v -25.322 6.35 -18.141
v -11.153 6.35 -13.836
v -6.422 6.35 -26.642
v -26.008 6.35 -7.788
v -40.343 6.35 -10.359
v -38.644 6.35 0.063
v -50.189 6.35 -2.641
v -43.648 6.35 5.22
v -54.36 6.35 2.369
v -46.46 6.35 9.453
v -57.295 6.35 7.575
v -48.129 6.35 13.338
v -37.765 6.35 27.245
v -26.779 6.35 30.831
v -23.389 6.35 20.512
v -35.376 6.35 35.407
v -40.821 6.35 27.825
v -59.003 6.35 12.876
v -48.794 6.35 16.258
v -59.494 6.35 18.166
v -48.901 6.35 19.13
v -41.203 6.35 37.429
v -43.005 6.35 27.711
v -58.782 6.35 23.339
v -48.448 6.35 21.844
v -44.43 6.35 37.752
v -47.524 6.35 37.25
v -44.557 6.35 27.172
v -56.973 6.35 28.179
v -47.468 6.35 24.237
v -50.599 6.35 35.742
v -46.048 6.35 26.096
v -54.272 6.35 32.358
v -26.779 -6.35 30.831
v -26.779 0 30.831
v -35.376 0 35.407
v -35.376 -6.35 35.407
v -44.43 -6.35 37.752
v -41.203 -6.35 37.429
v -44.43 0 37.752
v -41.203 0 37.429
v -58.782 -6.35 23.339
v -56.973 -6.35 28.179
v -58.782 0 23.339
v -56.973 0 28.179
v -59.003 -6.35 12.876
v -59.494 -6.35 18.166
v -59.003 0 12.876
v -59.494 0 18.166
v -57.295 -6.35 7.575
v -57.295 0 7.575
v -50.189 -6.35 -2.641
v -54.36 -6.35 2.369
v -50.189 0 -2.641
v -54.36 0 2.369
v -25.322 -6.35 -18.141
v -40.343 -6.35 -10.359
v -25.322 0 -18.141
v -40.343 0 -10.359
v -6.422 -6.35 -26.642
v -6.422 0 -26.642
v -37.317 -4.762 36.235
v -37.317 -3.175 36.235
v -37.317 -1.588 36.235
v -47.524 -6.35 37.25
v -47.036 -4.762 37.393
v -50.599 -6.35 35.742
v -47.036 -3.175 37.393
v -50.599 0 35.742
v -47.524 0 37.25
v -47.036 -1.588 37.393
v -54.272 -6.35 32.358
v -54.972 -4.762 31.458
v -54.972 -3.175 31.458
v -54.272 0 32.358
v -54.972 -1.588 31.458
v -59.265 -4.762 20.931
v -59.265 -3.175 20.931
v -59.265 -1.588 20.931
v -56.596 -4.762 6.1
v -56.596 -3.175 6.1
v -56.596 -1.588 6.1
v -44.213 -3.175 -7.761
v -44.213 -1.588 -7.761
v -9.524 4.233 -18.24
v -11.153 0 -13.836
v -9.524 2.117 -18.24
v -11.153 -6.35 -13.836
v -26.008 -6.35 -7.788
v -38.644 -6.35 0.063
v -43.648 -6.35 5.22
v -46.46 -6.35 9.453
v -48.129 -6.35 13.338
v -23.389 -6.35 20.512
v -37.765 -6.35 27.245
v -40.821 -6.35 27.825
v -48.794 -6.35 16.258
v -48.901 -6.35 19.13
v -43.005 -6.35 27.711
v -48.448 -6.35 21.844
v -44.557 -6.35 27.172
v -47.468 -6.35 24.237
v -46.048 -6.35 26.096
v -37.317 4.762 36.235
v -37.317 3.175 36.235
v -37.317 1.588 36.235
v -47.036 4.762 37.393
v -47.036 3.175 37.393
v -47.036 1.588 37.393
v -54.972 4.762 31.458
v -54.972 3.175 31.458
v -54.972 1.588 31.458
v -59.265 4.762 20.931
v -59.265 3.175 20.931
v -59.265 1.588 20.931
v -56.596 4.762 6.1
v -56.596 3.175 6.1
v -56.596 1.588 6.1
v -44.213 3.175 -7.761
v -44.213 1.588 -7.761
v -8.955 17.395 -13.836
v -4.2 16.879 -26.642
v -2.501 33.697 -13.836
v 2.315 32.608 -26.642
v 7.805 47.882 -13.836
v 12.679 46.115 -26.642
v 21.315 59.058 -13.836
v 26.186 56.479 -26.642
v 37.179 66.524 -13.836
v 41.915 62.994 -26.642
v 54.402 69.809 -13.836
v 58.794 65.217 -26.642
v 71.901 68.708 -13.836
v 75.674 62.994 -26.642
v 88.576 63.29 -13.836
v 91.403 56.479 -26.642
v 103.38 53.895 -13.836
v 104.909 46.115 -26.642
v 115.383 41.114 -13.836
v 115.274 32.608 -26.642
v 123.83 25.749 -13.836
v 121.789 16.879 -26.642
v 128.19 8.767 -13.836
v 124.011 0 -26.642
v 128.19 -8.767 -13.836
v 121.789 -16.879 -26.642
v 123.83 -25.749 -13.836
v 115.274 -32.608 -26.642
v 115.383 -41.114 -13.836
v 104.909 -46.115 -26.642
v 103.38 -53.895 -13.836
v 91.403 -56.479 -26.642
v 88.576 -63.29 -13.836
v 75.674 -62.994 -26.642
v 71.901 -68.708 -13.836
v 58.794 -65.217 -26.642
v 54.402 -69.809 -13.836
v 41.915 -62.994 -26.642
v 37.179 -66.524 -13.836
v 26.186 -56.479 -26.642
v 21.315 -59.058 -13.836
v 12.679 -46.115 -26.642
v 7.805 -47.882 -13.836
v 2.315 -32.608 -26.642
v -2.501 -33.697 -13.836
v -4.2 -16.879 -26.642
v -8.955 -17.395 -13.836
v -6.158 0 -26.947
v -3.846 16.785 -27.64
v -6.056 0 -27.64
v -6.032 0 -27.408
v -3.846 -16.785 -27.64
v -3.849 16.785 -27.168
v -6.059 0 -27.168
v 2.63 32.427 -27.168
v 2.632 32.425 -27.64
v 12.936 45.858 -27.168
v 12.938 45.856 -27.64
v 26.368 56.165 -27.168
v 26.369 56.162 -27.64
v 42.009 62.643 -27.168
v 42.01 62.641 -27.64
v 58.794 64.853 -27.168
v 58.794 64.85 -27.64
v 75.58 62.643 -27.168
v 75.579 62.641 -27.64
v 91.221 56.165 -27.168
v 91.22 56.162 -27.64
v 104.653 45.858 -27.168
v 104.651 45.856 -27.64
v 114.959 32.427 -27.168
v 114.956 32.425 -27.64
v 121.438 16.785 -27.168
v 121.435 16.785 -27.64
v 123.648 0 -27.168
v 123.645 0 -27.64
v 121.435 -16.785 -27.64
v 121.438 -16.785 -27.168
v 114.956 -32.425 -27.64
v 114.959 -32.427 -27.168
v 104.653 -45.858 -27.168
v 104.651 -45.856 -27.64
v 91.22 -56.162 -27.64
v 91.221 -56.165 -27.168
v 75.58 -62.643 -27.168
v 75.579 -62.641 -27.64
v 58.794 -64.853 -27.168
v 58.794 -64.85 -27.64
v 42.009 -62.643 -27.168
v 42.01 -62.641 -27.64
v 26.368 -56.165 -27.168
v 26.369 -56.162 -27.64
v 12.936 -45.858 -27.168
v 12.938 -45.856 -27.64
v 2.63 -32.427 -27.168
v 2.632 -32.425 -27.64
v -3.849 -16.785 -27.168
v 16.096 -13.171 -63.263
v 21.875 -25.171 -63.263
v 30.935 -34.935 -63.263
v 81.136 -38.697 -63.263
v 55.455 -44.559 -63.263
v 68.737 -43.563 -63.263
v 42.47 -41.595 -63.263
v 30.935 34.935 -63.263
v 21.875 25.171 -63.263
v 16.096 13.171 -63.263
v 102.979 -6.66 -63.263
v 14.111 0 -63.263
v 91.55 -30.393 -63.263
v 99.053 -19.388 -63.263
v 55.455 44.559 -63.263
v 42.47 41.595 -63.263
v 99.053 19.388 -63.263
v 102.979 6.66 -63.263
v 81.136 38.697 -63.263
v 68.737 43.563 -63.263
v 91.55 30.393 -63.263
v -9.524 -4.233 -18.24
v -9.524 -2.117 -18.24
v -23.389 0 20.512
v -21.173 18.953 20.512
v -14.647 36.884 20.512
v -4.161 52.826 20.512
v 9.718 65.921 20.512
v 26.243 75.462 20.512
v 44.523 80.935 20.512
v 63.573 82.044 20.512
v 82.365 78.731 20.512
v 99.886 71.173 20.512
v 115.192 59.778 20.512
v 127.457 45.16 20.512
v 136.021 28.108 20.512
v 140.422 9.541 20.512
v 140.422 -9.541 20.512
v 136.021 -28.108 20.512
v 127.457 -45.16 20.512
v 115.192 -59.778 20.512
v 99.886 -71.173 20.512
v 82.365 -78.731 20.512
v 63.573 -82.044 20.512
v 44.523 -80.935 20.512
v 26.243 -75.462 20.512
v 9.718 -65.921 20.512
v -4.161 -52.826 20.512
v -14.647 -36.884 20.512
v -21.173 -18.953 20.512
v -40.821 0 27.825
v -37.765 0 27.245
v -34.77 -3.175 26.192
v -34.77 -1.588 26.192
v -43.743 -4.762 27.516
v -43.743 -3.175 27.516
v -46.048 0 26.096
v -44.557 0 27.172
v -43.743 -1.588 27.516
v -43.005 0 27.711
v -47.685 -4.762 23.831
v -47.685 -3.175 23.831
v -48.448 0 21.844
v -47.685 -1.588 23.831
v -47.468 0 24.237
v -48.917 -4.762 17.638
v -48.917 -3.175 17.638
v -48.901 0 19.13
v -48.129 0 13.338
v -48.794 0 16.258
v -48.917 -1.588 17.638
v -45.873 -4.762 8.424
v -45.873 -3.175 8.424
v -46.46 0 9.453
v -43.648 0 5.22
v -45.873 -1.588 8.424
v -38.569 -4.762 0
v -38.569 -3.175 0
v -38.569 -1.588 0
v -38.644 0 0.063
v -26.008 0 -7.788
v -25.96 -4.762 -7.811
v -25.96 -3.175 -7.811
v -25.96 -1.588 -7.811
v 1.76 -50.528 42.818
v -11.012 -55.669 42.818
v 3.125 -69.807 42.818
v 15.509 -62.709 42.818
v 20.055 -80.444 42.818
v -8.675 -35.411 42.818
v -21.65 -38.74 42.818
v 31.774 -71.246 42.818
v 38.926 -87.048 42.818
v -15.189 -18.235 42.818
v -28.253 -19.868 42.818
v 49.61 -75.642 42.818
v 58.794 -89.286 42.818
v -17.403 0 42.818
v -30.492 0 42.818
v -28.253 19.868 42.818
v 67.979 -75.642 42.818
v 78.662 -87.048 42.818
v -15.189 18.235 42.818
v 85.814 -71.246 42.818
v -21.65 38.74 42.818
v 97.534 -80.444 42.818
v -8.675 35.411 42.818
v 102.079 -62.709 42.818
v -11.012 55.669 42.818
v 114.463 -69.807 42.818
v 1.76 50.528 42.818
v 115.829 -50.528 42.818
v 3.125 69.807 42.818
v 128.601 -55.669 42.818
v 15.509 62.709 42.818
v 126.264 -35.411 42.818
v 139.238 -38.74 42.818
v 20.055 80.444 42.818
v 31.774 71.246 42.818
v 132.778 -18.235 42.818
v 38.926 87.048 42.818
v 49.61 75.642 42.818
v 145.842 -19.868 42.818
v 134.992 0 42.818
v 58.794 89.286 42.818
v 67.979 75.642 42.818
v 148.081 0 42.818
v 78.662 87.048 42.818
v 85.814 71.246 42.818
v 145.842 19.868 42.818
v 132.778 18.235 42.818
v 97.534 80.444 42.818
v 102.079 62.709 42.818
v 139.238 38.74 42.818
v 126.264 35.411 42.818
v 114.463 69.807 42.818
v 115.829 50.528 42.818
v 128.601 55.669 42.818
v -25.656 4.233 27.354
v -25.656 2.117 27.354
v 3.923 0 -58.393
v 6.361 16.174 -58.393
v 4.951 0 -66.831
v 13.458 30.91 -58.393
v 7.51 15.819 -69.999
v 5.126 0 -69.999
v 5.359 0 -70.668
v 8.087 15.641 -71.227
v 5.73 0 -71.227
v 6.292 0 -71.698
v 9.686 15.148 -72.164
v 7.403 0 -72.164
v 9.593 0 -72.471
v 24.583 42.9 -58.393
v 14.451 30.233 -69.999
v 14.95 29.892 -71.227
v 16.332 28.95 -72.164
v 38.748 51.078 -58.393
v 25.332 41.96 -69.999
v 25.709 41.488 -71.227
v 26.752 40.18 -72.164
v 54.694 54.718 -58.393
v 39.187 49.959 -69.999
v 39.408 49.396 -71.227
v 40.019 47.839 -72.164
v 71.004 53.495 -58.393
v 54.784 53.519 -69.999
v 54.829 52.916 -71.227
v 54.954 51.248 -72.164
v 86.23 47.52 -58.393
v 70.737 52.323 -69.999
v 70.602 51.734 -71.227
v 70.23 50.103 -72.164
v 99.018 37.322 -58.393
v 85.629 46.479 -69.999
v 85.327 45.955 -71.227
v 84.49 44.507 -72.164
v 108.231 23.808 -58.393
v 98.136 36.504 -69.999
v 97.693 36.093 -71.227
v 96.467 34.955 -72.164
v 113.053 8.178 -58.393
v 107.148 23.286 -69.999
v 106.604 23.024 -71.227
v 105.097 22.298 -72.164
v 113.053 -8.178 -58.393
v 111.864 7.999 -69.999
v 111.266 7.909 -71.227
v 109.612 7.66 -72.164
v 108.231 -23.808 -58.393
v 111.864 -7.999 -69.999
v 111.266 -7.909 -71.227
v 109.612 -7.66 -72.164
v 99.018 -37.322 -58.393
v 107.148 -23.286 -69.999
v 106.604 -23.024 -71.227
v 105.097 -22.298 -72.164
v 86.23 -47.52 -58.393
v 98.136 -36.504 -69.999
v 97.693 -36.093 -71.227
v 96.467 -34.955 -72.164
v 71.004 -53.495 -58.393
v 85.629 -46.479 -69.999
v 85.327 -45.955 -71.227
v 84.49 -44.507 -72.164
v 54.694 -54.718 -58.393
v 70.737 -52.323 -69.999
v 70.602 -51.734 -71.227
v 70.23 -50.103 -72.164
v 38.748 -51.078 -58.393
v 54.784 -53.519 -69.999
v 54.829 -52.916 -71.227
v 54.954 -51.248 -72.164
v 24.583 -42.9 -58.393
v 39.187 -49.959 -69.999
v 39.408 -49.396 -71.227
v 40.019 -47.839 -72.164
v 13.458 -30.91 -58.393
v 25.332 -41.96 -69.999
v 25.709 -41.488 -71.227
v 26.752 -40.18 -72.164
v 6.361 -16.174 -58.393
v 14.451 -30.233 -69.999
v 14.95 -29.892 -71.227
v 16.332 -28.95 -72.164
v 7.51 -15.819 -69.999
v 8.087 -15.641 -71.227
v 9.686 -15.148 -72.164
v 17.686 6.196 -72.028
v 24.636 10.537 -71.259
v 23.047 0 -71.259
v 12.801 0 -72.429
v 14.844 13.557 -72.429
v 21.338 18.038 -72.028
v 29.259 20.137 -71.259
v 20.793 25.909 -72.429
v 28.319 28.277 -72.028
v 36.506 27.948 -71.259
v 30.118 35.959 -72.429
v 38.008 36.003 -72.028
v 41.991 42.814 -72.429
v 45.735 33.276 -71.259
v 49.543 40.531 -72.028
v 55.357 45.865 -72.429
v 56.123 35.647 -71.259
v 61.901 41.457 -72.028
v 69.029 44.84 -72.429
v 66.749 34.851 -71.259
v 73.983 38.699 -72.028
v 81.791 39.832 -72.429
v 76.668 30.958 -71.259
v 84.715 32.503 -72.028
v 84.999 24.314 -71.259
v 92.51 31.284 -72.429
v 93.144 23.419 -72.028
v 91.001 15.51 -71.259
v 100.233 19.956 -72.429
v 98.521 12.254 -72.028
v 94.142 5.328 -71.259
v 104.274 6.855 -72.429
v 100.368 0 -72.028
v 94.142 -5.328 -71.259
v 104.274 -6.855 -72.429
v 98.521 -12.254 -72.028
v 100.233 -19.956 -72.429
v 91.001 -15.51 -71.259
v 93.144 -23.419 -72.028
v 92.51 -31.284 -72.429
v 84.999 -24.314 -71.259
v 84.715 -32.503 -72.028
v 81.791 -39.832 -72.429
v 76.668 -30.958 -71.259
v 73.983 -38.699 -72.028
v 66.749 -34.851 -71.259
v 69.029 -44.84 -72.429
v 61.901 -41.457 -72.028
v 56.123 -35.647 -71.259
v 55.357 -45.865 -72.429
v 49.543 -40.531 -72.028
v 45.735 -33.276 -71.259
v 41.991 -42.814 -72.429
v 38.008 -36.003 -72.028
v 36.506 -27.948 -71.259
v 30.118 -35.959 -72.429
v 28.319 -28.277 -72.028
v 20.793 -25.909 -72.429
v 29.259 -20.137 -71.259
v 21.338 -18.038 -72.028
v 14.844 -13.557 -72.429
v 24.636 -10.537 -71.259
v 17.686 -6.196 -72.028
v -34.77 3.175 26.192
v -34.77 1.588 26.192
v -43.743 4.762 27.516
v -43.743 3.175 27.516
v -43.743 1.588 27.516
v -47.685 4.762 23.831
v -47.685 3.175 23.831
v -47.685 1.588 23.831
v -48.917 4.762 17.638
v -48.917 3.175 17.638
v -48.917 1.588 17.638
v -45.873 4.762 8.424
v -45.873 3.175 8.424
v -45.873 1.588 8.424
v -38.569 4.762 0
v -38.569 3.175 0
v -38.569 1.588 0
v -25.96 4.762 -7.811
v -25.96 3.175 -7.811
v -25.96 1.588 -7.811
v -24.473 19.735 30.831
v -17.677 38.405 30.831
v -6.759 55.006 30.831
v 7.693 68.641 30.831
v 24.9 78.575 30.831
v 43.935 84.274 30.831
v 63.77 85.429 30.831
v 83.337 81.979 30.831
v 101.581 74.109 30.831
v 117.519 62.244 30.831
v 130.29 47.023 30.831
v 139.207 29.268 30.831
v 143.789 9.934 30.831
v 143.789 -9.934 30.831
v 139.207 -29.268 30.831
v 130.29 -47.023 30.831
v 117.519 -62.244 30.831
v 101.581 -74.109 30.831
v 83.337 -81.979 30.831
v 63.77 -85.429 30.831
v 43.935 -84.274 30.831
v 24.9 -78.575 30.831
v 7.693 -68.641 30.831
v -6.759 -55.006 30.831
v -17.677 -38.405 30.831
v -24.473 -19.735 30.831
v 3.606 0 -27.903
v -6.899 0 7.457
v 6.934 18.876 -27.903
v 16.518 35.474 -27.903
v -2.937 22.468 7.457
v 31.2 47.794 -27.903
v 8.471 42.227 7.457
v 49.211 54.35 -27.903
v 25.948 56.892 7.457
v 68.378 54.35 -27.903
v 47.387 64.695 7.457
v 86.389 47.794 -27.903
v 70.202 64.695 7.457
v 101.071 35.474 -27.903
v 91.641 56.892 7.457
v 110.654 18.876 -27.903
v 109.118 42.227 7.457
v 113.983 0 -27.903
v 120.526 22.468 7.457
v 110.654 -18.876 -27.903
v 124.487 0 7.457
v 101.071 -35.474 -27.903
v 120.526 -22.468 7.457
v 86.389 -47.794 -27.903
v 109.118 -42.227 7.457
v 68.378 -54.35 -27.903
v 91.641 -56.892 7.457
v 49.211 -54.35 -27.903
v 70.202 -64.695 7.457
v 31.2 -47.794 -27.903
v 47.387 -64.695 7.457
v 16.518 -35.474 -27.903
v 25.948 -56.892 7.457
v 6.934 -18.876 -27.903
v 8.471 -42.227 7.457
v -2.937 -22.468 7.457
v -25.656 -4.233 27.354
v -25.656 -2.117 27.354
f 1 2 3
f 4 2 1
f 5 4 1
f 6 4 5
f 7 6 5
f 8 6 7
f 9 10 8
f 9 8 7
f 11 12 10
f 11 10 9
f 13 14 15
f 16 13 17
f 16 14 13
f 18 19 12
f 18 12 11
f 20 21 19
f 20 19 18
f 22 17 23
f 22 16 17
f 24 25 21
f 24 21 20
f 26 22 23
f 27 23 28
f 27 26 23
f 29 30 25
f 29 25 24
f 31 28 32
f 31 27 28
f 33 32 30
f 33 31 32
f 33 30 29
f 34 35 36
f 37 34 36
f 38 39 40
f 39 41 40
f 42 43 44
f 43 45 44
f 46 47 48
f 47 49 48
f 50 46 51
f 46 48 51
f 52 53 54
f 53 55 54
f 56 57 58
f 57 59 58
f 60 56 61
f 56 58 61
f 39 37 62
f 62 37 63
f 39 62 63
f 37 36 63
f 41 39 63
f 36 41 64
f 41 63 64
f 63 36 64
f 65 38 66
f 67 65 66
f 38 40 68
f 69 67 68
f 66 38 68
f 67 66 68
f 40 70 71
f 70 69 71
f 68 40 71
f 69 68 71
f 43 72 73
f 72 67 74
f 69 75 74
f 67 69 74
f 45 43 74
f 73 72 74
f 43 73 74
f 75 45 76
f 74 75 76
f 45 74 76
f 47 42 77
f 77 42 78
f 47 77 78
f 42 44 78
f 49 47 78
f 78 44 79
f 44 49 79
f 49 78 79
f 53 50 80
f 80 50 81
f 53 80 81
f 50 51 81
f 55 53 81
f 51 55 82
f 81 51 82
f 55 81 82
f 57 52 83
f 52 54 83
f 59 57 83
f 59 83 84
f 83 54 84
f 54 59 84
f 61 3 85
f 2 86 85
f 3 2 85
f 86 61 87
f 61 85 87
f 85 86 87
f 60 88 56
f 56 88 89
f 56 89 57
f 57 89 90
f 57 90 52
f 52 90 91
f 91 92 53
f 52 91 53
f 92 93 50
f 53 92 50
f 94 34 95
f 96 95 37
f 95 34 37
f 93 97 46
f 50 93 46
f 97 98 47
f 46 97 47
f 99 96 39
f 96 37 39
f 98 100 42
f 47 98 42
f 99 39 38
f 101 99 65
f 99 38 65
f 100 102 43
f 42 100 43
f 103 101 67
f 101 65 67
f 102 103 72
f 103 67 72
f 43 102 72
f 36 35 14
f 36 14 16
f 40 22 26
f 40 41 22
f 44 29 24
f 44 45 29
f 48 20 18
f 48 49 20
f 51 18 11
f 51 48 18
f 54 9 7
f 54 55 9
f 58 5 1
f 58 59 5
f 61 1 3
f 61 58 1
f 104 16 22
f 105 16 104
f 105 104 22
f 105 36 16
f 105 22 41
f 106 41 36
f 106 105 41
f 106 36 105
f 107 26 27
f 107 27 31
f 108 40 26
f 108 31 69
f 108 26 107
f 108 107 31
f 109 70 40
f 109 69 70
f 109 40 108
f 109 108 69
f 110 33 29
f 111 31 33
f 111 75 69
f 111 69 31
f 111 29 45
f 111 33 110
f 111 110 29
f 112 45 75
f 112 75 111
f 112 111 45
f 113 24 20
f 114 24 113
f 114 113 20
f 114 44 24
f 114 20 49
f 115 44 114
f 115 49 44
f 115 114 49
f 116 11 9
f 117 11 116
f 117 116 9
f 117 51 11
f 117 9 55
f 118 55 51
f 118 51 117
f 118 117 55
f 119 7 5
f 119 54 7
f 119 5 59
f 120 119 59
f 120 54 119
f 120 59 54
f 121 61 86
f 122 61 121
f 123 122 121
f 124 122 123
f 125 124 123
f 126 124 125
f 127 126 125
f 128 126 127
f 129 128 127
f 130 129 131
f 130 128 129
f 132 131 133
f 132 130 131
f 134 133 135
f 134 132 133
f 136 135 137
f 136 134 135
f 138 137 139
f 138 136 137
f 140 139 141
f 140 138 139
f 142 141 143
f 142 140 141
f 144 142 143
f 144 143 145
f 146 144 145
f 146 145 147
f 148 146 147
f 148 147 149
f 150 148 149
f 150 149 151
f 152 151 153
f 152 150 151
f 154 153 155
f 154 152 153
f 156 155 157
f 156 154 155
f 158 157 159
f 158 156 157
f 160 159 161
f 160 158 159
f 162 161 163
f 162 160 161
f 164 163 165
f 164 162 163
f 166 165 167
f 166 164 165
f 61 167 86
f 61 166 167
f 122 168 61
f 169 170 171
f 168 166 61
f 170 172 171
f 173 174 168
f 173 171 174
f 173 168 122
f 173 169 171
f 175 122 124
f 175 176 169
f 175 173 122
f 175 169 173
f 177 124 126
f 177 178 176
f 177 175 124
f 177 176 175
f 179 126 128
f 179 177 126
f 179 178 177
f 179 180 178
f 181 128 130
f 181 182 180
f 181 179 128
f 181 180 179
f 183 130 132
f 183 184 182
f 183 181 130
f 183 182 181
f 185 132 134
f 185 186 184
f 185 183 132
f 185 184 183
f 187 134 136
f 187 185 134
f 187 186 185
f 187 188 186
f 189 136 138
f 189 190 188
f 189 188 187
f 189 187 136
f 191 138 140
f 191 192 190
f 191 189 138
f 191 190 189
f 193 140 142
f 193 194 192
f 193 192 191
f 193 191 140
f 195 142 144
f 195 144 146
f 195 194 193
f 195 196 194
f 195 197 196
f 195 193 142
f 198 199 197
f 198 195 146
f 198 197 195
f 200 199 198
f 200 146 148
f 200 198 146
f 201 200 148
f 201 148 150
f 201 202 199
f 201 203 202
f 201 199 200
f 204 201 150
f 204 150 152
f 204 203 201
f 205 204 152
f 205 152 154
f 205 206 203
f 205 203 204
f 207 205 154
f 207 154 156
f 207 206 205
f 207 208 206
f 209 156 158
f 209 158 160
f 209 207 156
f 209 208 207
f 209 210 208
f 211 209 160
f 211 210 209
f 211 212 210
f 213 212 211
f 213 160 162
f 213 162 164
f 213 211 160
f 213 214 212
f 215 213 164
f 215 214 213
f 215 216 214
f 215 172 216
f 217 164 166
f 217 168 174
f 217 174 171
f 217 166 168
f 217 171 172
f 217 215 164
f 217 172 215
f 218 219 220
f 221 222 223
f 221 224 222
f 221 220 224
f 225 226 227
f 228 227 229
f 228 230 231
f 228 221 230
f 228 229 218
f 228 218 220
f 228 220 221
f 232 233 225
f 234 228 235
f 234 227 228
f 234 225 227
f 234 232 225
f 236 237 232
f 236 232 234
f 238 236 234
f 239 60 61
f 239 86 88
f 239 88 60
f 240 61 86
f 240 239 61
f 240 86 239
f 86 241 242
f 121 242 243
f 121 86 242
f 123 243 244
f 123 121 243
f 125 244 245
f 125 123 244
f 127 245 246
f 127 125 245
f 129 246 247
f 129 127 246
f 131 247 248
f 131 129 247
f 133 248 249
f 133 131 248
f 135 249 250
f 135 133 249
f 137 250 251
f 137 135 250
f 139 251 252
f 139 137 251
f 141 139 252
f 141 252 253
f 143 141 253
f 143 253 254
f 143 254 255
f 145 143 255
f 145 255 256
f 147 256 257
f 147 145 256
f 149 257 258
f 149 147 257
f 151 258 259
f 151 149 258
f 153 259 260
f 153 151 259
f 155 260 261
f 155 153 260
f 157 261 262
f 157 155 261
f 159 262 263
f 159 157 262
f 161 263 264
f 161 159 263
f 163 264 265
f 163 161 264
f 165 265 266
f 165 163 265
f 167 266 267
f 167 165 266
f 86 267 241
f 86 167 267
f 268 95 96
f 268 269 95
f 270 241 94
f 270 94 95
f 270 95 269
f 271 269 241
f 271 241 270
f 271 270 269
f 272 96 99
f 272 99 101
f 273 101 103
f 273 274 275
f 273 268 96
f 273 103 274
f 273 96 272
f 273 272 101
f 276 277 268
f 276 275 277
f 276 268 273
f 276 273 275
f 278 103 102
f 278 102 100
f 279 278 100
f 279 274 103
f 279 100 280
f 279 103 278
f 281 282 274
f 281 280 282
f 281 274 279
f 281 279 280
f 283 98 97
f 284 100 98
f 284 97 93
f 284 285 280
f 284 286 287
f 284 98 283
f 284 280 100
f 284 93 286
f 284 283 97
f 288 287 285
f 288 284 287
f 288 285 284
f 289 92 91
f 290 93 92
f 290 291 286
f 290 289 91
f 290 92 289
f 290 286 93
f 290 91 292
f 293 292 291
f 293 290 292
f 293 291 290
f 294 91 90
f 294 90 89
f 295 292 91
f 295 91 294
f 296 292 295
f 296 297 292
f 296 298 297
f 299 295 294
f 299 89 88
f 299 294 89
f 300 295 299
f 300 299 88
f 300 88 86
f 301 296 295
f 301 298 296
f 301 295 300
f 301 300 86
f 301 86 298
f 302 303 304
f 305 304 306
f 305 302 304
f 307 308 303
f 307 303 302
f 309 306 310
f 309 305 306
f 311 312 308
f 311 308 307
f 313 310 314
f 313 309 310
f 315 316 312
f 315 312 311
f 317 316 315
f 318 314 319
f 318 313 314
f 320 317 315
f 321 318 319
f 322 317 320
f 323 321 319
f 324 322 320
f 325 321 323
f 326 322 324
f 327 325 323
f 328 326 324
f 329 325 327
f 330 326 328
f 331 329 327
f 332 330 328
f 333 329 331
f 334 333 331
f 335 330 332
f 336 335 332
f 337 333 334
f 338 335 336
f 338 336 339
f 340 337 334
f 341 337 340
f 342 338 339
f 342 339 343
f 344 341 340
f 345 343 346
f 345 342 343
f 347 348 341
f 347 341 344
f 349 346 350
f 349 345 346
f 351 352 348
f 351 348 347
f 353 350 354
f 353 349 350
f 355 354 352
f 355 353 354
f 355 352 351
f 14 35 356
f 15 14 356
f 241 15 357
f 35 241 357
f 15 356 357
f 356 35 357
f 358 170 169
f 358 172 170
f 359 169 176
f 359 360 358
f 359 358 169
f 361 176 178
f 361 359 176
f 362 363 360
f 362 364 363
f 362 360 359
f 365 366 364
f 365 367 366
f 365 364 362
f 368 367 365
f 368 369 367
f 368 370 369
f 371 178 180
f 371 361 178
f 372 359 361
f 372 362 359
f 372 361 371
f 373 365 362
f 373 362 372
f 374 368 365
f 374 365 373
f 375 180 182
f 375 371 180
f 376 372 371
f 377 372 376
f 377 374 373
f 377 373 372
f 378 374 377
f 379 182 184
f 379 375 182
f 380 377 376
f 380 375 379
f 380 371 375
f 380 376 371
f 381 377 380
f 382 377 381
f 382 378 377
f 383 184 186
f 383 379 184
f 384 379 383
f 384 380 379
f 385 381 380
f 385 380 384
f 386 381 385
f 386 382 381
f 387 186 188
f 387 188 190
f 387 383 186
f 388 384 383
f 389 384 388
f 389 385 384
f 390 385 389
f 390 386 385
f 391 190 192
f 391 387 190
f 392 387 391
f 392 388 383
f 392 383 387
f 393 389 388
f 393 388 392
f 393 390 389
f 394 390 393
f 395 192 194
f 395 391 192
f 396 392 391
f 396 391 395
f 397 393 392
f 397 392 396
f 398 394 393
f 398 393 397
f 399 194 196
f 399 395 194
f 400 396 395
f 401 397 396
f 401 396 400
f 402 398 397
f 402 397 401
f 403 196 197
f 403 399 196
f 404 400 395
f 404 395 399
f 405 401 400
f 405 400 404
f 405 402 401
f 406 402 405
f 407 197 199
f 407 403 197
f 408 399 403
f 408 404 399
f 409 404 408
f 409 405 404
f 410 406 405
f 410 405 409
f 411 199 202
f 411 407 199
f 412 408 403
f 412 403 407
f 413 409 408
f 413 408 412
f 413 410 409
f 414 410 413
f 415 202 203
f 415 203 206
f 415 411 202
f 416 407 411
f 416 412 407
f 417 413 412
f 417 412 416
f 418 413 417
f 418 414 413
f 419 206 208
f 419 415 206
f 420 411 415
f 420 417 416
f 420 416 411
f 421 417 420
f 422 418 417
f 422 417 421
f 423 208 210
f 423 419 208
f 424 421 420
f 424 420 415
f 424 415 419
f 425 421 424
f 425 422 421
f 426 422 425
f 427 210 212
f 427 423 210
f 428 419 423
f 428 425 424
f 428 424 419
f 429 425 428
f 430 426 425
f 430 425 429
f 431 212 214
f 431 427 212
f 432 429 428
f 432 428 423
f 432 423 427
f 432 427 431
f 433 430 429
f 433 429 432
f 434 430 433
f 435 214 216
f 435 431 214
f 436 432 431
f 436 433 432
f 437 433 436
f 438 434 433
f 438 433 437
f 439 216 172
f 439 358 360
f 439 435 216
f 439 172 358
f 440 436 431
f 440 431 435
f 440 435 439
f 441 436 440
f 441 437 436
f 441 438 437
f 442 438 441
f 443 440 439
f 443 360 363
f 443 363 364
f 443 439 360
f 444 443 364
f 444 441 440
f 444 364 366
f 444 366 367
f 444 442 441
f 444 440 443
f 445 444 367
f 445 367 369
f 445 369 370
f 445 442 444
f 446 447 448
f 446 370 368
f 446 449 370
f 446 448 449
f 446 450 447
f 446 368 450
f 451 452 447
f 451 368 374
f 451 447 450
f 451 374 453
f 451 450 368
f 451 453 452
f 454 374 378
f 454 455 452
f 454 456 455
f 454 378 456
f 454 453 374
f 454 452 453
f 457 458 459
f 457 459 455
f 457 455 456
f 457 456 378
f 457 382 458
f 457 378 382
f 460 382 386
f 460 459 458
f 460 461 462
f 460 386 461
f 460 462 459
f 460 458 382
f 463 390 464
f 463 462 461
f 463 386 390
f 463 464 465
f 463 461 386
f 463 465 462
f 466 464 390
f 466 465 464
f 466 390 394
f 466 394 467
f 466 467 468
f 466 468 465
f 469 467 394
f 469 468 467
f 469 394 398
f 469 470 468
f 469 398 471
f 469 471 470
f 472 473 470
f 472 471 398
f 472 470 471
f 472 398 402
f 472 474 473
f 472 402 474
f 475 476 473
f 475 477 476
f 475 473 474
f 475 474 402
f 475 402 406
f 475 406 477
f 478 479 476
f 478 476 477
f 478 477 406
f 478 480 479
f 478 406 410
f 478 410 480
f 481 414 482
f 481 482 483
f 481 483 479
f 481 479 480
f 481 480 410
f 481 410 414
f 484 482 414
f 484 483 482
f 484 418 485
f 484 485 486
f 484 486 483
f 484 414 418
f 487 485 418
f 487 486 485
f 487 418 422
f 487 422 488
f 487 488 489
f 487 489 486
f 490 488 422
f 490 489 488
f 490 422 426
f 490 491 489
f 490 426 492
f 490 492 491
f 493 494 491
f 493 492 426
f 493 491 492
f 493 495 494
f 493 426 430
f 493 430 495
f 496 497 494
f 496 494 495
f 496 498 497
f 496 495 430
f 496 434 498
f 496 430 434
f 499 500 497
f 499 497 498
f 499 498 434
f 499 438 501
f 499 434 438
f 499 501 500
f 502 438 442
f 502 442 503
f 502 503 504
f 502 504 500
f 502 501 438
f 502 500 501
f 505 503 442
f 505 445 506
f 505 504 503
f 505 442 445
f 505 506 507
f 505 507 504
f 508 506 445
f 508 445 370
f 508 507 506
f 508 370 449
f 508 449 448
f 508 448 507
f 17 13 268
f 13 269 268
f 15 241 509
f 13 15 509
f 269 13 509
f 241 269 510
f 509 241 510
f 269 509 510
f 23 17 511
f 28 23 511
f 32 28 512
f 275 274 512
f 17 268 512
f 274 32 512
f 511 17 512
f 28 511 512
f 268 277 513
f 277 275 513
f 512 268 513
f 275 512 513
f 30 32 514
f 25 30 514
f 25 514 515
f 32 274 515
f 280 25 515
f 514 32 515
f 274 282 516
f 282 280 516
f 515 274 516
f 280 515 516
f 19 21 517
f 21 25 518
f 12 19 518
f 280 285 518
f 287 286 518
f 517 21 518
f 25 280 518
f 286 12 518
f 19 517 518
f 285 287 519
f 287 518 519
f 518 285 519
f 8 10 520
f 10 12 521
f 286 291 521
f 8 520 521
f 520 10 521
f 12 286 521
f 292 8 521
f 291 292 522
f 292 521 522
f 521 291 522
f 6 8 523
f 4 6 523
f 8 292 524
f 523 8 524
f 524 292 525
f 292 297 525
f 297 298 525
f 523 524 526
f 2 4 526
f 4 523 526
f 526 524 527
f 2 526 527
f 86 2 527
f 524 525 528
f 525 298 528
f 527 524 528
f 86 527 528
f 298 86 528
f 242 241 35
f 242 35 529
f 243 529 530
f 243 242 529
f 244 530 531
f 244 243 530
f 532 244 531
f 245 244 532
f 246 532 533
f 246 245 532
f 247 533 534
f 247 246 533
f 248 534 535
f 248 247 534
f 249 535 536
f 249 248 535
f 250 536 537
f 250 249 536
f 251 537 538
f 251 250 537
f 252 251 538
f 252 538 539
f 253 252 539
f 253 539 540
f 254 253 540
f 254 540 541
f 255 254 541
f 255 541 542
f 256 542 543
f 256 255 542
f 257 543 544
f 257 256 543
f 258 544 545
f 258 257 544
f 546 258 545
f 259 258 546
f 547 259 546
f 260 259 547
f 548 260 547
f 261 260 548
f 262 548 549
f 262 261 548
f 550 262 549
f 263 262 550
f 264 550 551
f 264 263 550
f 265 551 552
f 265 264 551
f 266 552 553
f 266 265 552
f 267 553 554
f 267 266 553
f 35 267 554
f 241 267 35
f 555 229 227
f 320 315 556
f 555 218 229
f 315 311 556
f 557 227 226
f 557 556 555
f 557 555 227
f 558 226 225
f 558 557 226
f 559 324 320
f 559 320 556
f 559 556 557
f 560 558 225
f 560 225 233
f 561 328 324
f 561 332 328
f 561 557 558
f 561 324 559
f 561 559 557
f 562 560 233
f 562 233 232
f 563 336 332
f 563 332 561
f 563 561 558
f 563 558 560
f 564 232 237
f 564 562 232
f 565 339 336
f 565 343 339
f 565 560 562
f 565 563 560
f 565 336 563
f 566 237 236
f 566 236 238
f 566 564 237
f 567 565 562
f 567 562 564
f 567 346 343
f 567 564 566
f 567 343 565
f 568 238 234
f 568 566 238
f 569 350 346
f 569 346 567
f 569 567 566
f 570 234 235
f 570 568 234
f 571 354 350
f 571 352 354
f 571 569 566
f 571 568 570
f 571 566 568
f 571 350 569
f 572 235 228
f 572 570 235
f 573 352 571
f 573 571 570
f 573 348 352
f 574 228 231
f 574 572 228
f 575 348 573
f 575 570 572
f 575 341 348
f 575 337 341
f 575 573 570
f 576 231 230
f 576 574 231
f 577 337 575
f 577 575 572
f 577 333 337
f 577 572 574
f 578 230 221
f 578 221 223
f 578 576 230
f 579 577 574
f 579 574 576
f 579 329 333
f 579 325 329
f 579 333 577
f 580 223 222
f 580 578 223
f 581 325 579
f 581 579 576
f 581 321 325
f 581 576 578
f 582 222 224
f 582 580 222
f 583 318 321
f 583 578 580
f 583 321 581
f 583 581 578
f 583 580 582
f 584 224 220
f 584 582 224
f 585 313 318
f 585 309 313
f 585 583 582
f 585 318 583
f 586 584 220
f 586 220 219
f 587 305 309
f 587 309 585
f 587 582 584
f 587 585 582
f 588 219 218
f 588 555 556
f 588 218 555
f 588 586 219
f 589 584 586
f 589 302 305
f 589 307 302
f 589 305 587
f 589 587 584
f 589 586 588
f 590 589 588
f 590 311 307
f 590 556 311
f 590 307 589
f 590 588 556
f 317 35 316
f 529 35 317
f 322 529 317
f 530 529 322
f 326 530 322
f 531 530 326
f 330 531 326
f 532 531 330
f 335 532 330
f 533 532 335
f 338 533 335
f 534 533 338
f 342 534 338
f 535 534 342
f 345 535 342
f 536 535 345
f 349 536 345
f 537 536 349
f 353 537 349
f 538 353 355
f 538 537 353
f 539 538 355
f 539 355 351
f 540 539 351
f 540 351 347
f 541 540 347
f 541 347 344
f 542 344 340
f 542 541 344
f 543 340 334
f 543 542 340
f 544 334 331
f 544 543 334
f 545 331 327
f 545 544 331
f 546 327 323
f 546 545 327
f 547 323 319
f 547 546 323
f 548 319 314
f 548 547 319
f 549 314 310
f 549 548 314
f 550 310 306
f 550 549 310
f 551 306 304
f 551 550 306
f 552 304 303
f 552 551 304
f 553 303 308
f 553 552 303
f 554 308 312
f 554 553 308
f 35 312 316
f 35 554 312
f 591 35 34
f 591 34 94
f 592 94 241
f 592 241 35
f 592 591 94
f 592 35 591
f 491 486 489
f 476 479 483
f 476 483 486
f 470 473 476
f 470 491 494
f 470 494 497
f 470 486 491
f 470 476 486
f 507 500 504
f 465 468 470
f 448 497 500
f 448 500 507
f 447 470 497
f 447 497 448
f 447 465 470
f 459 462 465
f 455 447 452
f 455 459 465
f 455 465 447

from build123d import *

# Parameters (mm, degrees)
F1_DEPTH = 6.35


with BuildPart() as f1:
    # F0 (on Front) → F1 (new body, symmetric)
    with BuildSketch(Plane.XZ):
        with BuildLine():
            add(Edge.make_bspline(
                [(-26.779282031, 30.8305839929), (-25.6599872306, 27.3359164201), (-24.5269169087, 23.8945397492), (-23.388681933, 20.5122753915)],
                knots=[0.0572413722, 0.0572413722, 0.0572413722, 0.0572413722, 0.1081291612, 0.1081291612, 0.1081291612, 0.1081291612], degree=3))
            add(Edge.make_bspline(
                [(-26.779282031, 30.8305839929), (-33.9641073682, 34.8686155193), (-47.7904028814, 43.0881960424), (-64.5885629334, 19.6560020505), (-50.1366297488, -11.4458780792), (-9.2230358971, -24.1099512444), (-6.4222046506, -26.6422513876)],
                knots=[0, 0, 0, 0, 0.206318069, 0.4087967984, 0.6632998285, 0.9539101751, 0.9539101751, 0.9539101751, 0.9539101751], degree=3))
            add(Edge.make_bspline(
                [(-11.1529605838, -13.8355021779), (-9.5017867072, -18.3061029042), (-7.914064356, -22.5823231964), (-6.4222046506, -26.6422513876)],
                knots=[0.2936194992, 0.2936194992, 0.2936194992, 0.2936194992, 0.3727777079, 0.3727777079, 0.3727777079, 0.3727777079], degree=3))
            add(Edge.make_bspline(
                [(-23.388681933, 20.5122753915), (-31.3587647344, 24.7259859161), (-44.4741122772, 32.263043577), (-51.7309465833, 16.3828269272), (-39.4091940553, -2.9788718203), (-21.3549569349, -10.0574184983), (-11.1529605838, -13.8355021779)],
                knots=[0, 0, 0, 0, 0.2571458127, 0.4422215918, 0.6928586951, 1, 1, 1, 1], degree=3))
        make_face()
    extrude(amount=F1_DEPTH, both=True)

    # F0 (on Front) → F2 (revolve)
    with BuildSketch(Plane.XZ):
        with BuildLine():
            Line((-17.4031369388, 42.8175656639), (-30.4918682477, 42.8175656639))
            add(Edge.make_bspline(
                [(-30.4918682477, 42.8175656639), (-29.2799400842, 38.7599998745), (-28.0383261293, 34.761577491), (-26.779282031, 30.8305839929)],
                knots=[0, 0, 0, 0, 0.0572413722, 0.0572413722, 0.0572413722, 0.0572413722], degree=3))
            add(Edge.make_bspline(
                [(-26.779282031, 30.8305839929), (-25.6599872306, 27.3359164201), (-24.5269169087, 23.8945397492), (-23.388681933, 20.5122753915)],
                knots=[0.0572413722, 0.0572413722, 0.0572413722, 0.0572413722, 0.1081291612, 0.1081291612, 0.1081291612, 0.1081291612], degree=3))
            add(Edge.make_bspline(
                [(-23.388681933, 20.5122753915), (-19.2397182058, 8.1836328569), (-15.0221335422, -3.3596051914), (-11.1529605838, -13.8355021779)],
                knots=[0.1081291612, 0.1081291612, 0.1081291612, 0.1081291612, 0.2936194992, 0.2936194992, 0.2936194992, 0.2936194992], degree=3))
            add(Edge.make_bspline(
                [(-11.1529605838, -13.8355021779), (-9.5017867072, -18.3061029042), (-7.914064356, -22.5823231964), (-6.4222046506, -26.6422513876)],
                knots=[0.2936194992, 0.2936194992, 0.2936194992, 0.2936194992, 0.3727777079, 0.3727777079, 0.3727777079, 0.3727777079], degree=3))
            add(Edge.make_bspline(
                [(-6.4222046506, -26.6422513876), (-5.9780022219, -27.0438656852), (-6.0119811368, -27.339355921), (-6.0560090254, -27.6397535643)],
                knots=[0.9539101751, 0.9539101751, 0.9539101751, 0.9539101751, 1, 1, 1, 1], degree=3))
            add(Edge.make_bspline(
                [(-6.0560090254, -27.6397535643), (0.0825960797, -44.3776523907), (8.441969007, -68.8198420623), (2.4540492736, -74.2481329269), (23.0473924894, -71.2587758899)],
                knots=[0.3792892362, 0.3792892362, 0.3792892362, 0.3792892362, 0.7085331873, 1, 1, 1, 1], degree=3))
            Line((23.0473924894, -71.2587758899), (58.7943717837, -71.2587758899))
            Line((58.7943717837, -71.2587758899), (58.7943717837, -63.262745738))
            Line((58.7943717837, -63.262745738), (14.1106499359, -63.262745738))
            Line((14.1106499359, -63.262745738), (-17.4031369388, 42.8175656639))
        make_face()
    revolve(axis=Axis((58.7943717837, 0, -67.260760814), (0, 0, -1)))


solid = f1.part
